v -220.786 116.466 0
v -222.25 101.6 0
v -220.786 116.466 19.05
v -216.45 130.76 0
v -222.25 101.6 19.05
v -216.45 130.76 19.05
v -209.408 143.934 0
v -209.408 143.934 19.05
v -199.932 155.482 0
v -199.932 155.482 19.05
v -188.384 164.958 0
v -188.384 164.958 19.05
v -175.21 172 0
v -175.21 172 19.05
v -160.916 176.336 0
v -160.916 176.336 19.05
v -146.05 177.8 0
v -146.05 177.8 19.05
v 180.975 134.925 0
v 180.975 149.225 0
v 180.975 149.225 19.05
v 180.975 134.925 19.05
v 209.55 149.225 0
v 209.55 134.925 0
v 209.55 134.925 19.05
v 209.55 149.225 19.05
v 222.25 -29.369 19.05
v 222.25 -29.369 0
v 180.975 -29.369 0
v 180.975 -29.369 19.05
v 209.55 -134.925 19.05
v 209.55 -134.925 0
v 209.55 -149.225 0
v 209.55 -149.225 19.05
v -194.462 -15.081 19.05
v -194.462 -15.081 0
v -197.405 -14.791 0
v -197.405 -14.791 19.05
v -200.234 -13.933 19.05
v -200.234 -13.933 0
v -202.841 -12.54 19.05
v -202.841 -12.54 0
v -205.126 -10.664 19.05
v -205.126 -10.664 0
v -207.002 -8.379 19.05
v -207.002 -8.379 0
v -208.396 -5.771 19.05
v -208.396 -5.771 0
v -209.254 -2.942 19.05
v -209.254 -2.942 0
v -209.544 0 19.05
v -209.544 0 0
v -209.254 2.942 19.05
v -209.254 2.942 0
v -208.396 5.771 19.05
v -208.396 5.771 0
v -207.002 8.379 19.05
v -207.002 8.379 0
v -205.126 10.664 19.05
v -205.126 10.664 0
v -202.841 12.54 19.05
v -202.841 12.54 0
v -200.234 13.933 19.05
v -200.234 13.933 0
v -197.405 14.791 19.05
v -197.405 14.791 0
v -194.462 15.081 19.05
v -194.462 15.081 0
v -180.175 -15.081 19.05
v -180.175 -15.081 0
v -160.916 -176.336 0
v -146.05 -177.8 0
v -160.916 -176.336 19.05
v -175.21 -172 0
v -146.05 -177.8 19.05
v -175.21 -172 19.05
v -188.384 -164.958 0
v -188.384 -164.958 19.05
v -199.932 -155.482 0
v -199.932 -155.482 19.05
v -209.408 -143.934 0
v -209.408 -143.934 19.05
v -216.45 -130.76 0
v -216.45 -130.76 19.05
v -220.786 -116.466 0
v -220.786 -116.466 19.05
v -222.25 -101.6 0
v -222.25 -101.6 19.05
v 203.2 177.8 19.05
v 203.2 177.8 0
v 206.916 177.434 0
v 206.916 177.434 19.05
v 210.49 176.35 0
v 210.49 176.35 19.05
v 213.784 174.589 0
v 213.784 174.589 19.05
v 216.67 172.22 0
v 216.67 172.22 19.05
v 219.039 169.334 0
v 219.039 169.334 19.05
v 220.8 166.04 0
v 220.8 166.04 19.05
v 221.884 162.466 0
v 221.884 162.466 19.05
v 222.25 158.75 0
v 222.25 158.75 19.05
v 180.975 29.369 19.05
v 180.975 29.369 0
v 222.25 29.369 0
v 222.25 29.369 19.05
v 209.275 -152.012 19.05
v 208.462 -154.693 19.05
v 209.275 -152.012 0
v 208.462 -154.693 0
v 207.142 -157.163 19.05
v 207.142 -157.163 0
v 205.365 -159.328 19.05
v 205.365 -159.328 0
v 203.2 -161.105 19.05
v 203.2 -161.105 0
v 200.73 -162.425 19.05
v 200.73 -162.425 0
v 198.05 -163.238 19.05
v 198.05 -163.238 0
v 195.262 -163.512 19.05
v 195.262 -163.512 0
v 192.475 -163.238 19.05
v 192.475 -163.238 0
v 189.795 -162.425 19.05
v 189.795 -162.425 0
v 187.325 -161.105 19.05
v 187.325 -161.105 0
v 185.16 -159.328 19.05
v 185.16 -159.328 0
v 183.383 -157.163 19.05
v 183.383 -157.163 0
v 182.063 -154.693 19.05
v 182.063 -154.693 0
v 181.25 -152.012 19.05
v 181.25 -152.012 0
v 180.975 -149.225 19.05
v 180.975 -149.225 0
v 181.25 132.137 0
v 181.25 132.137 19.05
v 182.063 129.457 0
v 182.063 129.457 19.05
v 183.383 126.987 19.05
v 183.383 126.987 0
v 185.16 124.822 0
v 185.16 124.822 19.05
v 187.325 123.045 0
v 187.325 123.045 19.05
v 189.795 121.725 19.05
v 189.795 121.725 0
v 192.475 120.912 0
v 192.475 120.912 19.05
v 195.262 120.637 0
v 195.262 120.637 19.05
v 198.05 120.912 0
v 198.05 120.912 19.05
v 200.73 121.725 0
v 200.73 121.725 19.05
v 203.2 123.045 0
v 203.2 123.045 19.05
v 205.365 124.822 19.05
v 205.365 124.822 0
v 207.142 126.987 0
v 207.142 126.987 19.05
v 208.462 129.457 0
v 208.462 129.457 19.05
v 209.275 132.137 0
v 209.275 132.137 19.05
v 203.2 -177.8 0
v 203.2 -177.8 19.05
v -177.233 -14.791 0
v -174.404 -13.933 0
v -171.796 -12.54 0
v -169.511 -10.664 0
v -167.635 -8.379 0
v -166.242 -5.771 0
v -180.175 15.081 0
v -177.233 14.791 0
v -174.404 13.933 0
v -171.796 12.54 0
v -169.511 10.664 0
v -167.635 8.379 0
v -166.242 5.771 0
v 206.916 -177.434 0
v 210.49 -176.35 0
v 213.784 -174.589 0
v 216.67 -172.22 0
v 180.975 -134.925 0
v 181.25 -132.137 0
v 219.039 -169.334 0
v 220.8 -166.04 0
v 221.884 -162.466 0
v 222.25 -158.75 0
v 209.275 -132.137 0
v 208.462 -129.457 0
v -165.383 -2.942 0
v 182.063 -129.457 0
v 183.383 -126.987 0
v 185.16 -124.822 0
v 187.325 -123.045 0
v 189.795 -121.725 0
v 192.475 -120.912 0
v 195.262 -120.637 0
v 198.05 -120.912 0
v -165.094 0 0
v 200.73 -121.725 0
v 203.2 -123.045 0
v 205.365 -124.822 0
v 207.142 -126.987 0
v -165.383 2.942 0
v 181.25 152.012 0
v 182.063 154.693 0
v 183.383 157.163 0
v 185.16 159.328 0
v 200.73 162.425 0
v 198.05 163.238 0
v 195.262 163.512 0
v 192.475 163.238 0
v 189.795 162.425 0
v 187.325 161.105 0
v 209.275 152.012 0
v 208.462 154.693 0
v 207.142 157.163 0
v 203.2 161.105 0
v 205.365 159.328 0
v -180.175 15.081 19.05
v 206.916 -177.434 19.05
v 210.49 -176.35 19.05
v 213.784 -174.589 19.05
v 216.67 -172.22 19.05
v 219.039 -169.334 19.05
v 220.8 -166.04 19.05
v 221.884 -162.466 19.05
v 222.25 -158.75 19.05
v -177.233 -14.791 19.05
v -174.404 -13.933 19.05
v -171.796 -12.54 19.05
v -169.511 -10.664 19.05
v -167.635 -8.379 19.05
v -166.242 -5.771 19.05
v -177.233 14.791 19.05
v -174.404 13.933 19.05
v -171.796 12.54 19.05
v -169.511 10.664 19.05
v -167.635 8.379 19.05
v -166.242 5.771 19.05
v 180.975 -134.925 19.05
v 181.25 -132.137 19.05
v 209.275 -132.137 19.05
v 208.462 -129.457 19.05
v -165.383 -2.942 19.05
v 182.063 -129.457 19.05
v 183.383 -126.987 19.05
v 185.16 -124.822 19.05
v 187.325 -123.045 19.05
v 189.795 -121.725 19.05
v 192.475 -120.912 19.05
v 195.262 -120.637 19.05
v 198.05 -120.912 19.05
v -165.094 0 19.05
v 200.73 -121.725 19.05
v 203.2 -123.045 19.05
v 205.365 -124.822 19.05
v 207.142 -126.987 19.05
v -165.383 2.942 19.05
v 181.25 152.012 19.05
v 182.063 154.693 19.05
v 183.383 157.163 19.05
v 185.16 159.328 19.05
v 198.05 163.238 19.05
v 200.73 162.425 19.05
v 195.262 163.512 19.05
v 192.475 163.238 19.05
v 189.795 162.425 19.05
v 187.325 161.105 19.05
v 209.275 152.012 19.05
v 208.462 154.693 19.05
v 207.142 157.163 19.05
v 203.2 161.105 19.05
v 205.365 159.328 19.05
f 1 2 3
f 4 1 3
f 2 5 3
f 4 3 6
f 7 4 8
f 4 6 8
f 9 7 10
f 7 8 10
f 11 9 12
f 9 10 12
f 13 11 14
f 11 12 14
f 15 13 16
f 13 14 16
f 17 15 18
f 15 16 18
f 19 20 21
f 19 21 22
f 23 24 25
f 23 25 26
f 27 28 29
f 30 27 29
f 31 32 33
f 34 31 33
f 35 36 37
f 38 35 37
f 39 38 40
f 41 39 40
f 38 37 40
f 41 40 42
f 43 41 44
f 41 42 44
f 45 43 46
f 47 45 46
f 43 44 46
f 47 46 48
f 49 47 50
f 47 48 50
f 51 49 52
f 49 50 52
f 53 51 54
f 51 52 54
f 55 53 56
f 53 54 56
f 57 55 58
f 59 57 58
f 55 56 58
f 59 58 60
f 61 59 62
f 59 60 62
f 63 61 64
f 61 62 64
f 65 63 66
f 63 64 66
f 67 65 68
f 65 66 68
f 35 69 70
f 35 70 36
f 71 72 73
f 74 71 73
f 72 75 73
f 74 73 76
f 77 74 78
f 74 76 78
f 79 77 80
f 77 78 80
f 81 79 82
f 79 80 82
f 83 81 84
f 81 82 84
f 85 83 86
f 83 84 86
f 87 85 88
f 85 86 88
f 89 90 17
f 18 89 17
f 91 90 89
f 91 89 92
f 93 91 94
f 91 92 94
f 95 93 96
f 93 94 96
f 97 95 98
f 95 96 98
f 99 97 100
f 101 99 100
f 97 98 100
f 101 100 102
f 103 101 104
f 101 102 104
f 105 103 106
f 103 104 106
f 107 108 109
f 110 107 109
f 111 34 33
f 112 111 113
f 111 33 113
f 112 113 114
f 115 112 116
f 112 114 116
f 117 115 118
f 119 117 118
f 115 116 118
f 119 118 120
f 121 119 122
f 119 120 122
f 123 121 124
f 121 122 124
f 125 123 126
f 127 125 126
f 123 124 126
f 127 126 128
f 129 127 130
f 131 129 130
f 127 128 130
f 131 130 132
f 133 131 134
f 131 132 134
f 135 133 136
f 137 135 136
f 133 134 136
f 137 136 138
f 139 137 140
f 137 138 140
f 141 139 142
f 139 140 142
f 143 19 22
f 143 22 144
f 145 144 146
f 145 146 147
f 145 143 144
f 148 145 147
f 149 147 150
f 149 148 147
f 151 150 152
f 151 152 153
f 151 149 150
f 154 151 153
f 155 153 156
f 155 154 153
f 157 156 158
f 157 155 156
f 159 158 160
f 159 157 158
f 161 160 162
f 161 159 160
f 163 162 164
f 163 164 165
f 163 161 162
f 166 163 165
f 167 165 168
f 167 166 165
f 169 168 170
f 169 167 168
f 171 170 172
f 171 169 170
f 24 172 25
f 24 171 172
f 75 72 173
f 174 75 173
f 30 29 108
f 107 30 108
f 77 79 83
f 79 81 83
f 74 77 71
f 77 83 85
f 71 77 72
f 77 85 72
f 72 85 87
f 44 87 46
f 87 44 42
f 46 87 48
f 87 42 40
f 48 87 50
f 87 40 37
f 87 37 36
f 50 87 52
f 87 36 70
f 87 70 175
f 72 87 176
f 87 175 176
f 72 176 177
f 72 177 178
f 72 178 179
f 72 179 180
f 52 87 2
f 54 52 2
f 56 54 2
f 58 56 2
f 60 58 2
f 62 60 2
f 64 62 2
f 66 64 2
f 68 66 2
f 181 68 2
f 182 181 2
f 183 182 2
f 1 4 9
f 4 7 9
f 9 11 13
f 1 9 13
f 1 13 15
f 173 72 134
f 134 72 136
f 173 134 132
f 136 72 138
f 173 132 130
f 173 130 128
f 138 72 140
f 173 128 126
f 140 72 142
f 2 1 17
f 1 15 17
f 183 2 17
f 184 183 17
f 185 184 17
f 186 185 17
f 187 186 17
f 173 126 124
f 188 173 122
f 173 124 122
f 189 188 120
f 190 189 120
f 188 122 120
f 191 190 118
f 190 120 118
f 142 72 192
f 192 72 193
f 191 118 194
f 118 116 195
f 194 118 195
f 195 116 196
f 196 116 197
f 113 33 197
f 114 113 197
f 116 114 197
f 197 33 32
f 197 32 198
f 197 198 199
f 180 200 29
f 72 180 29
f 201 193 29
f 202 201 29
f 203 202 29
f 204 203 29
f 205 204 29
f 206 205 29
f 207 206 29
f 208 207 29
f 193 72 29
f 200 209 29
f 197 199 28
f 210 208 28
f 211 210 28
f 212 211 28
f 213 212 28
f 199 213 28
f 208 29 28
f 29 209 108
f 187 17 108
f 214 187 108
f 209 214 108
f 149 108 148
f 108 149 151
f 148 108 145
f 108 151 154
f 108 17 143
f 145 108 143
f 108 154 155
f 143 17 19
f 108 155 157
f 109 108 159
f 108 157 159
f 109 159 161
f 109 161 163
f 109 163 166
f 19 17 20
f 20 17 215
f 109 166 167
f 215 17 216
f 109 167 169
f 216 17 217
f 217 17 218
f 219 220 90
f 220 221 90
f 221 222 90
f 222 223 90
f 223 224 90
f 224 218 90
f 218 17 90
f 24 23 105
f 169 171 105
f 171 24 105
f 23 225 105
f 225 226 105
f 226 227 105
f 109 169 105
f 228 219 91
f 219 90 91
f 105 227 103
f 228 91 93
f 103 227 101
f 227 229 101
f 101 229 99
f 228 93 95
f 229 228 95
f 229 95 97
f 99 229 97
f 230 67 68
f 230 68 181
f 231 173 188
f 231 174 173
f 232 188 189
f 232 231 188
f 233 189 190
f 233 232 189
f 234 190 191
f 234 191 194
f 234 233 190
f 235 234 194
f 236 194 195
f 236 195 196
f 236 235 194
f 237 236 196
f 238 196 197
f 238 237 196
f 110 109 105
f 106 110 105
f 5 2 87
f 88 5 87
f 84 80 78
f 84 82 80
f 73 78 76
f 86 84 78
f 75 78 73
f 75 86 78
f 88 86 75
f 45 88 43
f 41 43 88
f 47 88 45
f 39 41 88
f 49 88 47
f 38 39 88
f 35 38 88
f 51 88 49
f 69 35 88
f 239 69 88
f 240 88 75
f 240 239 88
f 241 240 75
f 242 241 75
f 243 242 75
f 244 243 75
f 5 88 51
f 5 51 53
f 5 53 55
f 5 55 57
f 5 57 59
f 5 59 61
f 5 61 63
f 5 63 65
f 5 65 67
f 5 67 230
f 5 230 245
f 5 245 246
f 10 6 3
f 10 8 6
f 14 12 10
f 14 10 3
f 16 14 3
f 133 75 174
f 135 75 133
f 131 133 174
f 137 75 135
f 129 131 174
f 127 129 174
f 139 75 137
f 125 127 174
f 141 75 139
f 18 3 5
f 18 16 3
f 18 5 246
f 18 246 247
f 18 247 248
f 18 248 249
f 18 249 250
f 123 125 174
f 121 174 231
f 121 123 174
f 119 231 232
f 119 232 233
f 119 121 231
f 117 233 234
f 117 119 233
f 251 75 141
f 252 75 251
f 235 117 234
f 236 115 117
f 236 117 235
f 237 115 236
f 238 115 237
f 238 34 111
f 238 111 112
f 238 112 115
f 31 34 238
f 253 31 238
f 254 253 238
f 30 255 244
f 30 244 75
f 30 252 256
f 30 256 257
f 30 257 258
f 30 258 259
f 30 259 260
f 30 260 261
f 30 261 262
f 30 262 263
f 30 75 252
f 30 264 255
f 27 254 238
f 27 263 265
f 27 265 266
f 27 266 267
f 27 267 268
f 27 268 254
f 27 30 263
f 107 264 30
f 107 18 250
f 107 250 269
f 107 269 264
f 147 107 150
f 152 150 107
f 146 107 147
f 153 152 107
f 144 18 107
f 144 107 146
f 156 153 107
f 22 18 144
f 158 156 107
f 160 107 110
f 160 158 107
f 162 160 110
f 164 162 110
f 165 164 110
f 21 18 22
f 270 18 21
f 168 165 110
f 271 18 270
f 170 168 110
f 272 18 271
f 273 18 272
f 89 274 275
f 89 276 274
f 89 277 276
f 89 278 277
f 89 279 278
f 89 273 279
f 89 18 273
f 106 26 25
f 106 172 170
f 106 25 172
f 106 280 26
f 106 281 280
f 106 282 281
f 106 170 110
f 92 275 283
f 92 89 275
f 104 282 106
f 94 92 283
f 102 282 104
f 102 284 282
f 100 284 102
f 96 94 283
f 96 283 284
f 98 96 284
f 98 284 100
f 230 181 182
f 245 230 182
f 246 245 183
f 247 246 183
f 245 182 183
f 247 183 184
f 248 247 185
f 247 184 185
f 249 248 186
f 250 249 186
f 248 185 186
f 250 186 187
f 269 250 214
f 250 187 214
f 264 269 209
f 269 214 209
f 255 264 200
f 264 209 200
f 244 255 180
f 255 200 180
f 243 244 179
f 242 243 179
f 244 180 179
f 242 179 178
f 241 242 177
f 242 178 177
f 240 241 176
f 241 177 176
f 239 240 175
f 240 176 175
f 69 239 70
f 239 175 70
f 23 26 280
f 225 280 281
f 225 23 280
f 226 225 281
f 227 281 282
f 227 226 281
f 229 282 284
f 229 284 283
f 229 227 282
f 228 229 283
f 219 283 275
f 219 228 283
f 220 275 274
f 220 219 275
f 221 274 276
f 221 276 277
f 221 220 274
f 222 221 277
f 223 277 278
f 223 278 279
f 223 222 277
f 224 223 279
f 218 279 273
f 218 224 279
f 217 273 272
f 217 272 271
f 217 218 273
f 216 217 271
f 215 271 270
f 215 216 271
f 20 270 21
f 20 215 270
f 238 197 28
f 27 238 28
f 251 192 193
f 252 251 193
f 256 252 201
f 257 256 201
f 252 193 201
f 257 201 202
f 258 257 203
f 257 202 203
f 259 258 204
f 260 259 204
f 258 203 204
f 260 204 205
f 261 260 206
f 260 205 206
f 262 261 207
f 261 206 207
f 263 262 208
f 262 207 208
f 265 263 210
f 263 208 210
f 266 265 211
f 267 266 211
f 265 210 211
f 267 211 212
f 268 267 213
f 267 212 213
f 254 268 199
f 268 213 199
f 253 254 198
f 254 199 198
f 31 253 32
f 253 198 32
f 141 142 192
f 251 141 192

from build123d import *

# Parameters (mm, degrees)
BOSS_EXTRUDE1_DEPTH = 19.05
FILLET1_R           = 76.2
FILLET2_R           = 19.05


with BuildPart() as part:
    # Sketch1 → Boss-Extrude1 (new body)
    with BuildSketch(Plane.XY):
        Polygon((-222.25, -177.8), (222.25, -177.8), (222.25, -29.36875), (180.975, -29.36875), (180.975, 29.36875), (222.25, 29.36875), (222.25, 177.8), (-222.25, 177.8), align=None)
        with BuildLine():
            Line((-194.4624, 15.08125), (-180.1749, 15.08125))
            ThreePointArc((-180.1749, 15.08125), (-165.09365, 0), (-180.1749, -15.08125))
            Line((-180.1749, -15.08125), (-194.4624, -15.08125))
            ThreePointArc((-194.4624, -15.08125), (-209.54365, 0), (-194.4624, 15.08125))
        make_face(mode=Mode.SUBTRACT)
        with BuildLine():
            Line((209.55, -134.9248), (209.55, -149.225))
            ThreePointArc((209.55, -149.225), (195.2625, -163.5125), (180.975, -149.225))
            Line((180.975, -149.225), (180.975, -134.9248))
            ThreePointArc((180.975, -134.9248), (195.2625, -120.6373), (209.55, -134.9248))
        make_face(mode=Mode.SUBTRACT)
        with BuildLine():
            Line((209.55, 134.9248), (209.55, 149.225))
            ThreePointArc((209.55, 149.225), (195.2625, 163.5125), (180.975, 149.225))
            Line((180.975, 149.225), (180.975, 134.9248))
            ThreePointArc((180.975, 134.9248), (195.2625, 120.6373), (209.55, 134.9248))
        make_face(mode=Mode.SUBTRACT)
    extrude(amount=BOSS_EXTRUDE1_DEPTH)

    # Fillet1
    fillet1_edges = [part.edges().sort_by_distance(p)[0] for p in [
        (-222.25, -177.8, 9.525),
        (-222.25, 177.8, 9.525),
    ]]
    fillet(fillet1_edges, radius=FILLET1_R)

    # Fillet2
    fillet2_edges = [part.edges().sort_by_distance(p)[0] for p in [
        (222.25, -177.8, 9.525),
        (222.25, 177.8, 9.525),
    ]]
    fillet(fillet2_edges, radius=FILLET2_R)


solid = part.part
